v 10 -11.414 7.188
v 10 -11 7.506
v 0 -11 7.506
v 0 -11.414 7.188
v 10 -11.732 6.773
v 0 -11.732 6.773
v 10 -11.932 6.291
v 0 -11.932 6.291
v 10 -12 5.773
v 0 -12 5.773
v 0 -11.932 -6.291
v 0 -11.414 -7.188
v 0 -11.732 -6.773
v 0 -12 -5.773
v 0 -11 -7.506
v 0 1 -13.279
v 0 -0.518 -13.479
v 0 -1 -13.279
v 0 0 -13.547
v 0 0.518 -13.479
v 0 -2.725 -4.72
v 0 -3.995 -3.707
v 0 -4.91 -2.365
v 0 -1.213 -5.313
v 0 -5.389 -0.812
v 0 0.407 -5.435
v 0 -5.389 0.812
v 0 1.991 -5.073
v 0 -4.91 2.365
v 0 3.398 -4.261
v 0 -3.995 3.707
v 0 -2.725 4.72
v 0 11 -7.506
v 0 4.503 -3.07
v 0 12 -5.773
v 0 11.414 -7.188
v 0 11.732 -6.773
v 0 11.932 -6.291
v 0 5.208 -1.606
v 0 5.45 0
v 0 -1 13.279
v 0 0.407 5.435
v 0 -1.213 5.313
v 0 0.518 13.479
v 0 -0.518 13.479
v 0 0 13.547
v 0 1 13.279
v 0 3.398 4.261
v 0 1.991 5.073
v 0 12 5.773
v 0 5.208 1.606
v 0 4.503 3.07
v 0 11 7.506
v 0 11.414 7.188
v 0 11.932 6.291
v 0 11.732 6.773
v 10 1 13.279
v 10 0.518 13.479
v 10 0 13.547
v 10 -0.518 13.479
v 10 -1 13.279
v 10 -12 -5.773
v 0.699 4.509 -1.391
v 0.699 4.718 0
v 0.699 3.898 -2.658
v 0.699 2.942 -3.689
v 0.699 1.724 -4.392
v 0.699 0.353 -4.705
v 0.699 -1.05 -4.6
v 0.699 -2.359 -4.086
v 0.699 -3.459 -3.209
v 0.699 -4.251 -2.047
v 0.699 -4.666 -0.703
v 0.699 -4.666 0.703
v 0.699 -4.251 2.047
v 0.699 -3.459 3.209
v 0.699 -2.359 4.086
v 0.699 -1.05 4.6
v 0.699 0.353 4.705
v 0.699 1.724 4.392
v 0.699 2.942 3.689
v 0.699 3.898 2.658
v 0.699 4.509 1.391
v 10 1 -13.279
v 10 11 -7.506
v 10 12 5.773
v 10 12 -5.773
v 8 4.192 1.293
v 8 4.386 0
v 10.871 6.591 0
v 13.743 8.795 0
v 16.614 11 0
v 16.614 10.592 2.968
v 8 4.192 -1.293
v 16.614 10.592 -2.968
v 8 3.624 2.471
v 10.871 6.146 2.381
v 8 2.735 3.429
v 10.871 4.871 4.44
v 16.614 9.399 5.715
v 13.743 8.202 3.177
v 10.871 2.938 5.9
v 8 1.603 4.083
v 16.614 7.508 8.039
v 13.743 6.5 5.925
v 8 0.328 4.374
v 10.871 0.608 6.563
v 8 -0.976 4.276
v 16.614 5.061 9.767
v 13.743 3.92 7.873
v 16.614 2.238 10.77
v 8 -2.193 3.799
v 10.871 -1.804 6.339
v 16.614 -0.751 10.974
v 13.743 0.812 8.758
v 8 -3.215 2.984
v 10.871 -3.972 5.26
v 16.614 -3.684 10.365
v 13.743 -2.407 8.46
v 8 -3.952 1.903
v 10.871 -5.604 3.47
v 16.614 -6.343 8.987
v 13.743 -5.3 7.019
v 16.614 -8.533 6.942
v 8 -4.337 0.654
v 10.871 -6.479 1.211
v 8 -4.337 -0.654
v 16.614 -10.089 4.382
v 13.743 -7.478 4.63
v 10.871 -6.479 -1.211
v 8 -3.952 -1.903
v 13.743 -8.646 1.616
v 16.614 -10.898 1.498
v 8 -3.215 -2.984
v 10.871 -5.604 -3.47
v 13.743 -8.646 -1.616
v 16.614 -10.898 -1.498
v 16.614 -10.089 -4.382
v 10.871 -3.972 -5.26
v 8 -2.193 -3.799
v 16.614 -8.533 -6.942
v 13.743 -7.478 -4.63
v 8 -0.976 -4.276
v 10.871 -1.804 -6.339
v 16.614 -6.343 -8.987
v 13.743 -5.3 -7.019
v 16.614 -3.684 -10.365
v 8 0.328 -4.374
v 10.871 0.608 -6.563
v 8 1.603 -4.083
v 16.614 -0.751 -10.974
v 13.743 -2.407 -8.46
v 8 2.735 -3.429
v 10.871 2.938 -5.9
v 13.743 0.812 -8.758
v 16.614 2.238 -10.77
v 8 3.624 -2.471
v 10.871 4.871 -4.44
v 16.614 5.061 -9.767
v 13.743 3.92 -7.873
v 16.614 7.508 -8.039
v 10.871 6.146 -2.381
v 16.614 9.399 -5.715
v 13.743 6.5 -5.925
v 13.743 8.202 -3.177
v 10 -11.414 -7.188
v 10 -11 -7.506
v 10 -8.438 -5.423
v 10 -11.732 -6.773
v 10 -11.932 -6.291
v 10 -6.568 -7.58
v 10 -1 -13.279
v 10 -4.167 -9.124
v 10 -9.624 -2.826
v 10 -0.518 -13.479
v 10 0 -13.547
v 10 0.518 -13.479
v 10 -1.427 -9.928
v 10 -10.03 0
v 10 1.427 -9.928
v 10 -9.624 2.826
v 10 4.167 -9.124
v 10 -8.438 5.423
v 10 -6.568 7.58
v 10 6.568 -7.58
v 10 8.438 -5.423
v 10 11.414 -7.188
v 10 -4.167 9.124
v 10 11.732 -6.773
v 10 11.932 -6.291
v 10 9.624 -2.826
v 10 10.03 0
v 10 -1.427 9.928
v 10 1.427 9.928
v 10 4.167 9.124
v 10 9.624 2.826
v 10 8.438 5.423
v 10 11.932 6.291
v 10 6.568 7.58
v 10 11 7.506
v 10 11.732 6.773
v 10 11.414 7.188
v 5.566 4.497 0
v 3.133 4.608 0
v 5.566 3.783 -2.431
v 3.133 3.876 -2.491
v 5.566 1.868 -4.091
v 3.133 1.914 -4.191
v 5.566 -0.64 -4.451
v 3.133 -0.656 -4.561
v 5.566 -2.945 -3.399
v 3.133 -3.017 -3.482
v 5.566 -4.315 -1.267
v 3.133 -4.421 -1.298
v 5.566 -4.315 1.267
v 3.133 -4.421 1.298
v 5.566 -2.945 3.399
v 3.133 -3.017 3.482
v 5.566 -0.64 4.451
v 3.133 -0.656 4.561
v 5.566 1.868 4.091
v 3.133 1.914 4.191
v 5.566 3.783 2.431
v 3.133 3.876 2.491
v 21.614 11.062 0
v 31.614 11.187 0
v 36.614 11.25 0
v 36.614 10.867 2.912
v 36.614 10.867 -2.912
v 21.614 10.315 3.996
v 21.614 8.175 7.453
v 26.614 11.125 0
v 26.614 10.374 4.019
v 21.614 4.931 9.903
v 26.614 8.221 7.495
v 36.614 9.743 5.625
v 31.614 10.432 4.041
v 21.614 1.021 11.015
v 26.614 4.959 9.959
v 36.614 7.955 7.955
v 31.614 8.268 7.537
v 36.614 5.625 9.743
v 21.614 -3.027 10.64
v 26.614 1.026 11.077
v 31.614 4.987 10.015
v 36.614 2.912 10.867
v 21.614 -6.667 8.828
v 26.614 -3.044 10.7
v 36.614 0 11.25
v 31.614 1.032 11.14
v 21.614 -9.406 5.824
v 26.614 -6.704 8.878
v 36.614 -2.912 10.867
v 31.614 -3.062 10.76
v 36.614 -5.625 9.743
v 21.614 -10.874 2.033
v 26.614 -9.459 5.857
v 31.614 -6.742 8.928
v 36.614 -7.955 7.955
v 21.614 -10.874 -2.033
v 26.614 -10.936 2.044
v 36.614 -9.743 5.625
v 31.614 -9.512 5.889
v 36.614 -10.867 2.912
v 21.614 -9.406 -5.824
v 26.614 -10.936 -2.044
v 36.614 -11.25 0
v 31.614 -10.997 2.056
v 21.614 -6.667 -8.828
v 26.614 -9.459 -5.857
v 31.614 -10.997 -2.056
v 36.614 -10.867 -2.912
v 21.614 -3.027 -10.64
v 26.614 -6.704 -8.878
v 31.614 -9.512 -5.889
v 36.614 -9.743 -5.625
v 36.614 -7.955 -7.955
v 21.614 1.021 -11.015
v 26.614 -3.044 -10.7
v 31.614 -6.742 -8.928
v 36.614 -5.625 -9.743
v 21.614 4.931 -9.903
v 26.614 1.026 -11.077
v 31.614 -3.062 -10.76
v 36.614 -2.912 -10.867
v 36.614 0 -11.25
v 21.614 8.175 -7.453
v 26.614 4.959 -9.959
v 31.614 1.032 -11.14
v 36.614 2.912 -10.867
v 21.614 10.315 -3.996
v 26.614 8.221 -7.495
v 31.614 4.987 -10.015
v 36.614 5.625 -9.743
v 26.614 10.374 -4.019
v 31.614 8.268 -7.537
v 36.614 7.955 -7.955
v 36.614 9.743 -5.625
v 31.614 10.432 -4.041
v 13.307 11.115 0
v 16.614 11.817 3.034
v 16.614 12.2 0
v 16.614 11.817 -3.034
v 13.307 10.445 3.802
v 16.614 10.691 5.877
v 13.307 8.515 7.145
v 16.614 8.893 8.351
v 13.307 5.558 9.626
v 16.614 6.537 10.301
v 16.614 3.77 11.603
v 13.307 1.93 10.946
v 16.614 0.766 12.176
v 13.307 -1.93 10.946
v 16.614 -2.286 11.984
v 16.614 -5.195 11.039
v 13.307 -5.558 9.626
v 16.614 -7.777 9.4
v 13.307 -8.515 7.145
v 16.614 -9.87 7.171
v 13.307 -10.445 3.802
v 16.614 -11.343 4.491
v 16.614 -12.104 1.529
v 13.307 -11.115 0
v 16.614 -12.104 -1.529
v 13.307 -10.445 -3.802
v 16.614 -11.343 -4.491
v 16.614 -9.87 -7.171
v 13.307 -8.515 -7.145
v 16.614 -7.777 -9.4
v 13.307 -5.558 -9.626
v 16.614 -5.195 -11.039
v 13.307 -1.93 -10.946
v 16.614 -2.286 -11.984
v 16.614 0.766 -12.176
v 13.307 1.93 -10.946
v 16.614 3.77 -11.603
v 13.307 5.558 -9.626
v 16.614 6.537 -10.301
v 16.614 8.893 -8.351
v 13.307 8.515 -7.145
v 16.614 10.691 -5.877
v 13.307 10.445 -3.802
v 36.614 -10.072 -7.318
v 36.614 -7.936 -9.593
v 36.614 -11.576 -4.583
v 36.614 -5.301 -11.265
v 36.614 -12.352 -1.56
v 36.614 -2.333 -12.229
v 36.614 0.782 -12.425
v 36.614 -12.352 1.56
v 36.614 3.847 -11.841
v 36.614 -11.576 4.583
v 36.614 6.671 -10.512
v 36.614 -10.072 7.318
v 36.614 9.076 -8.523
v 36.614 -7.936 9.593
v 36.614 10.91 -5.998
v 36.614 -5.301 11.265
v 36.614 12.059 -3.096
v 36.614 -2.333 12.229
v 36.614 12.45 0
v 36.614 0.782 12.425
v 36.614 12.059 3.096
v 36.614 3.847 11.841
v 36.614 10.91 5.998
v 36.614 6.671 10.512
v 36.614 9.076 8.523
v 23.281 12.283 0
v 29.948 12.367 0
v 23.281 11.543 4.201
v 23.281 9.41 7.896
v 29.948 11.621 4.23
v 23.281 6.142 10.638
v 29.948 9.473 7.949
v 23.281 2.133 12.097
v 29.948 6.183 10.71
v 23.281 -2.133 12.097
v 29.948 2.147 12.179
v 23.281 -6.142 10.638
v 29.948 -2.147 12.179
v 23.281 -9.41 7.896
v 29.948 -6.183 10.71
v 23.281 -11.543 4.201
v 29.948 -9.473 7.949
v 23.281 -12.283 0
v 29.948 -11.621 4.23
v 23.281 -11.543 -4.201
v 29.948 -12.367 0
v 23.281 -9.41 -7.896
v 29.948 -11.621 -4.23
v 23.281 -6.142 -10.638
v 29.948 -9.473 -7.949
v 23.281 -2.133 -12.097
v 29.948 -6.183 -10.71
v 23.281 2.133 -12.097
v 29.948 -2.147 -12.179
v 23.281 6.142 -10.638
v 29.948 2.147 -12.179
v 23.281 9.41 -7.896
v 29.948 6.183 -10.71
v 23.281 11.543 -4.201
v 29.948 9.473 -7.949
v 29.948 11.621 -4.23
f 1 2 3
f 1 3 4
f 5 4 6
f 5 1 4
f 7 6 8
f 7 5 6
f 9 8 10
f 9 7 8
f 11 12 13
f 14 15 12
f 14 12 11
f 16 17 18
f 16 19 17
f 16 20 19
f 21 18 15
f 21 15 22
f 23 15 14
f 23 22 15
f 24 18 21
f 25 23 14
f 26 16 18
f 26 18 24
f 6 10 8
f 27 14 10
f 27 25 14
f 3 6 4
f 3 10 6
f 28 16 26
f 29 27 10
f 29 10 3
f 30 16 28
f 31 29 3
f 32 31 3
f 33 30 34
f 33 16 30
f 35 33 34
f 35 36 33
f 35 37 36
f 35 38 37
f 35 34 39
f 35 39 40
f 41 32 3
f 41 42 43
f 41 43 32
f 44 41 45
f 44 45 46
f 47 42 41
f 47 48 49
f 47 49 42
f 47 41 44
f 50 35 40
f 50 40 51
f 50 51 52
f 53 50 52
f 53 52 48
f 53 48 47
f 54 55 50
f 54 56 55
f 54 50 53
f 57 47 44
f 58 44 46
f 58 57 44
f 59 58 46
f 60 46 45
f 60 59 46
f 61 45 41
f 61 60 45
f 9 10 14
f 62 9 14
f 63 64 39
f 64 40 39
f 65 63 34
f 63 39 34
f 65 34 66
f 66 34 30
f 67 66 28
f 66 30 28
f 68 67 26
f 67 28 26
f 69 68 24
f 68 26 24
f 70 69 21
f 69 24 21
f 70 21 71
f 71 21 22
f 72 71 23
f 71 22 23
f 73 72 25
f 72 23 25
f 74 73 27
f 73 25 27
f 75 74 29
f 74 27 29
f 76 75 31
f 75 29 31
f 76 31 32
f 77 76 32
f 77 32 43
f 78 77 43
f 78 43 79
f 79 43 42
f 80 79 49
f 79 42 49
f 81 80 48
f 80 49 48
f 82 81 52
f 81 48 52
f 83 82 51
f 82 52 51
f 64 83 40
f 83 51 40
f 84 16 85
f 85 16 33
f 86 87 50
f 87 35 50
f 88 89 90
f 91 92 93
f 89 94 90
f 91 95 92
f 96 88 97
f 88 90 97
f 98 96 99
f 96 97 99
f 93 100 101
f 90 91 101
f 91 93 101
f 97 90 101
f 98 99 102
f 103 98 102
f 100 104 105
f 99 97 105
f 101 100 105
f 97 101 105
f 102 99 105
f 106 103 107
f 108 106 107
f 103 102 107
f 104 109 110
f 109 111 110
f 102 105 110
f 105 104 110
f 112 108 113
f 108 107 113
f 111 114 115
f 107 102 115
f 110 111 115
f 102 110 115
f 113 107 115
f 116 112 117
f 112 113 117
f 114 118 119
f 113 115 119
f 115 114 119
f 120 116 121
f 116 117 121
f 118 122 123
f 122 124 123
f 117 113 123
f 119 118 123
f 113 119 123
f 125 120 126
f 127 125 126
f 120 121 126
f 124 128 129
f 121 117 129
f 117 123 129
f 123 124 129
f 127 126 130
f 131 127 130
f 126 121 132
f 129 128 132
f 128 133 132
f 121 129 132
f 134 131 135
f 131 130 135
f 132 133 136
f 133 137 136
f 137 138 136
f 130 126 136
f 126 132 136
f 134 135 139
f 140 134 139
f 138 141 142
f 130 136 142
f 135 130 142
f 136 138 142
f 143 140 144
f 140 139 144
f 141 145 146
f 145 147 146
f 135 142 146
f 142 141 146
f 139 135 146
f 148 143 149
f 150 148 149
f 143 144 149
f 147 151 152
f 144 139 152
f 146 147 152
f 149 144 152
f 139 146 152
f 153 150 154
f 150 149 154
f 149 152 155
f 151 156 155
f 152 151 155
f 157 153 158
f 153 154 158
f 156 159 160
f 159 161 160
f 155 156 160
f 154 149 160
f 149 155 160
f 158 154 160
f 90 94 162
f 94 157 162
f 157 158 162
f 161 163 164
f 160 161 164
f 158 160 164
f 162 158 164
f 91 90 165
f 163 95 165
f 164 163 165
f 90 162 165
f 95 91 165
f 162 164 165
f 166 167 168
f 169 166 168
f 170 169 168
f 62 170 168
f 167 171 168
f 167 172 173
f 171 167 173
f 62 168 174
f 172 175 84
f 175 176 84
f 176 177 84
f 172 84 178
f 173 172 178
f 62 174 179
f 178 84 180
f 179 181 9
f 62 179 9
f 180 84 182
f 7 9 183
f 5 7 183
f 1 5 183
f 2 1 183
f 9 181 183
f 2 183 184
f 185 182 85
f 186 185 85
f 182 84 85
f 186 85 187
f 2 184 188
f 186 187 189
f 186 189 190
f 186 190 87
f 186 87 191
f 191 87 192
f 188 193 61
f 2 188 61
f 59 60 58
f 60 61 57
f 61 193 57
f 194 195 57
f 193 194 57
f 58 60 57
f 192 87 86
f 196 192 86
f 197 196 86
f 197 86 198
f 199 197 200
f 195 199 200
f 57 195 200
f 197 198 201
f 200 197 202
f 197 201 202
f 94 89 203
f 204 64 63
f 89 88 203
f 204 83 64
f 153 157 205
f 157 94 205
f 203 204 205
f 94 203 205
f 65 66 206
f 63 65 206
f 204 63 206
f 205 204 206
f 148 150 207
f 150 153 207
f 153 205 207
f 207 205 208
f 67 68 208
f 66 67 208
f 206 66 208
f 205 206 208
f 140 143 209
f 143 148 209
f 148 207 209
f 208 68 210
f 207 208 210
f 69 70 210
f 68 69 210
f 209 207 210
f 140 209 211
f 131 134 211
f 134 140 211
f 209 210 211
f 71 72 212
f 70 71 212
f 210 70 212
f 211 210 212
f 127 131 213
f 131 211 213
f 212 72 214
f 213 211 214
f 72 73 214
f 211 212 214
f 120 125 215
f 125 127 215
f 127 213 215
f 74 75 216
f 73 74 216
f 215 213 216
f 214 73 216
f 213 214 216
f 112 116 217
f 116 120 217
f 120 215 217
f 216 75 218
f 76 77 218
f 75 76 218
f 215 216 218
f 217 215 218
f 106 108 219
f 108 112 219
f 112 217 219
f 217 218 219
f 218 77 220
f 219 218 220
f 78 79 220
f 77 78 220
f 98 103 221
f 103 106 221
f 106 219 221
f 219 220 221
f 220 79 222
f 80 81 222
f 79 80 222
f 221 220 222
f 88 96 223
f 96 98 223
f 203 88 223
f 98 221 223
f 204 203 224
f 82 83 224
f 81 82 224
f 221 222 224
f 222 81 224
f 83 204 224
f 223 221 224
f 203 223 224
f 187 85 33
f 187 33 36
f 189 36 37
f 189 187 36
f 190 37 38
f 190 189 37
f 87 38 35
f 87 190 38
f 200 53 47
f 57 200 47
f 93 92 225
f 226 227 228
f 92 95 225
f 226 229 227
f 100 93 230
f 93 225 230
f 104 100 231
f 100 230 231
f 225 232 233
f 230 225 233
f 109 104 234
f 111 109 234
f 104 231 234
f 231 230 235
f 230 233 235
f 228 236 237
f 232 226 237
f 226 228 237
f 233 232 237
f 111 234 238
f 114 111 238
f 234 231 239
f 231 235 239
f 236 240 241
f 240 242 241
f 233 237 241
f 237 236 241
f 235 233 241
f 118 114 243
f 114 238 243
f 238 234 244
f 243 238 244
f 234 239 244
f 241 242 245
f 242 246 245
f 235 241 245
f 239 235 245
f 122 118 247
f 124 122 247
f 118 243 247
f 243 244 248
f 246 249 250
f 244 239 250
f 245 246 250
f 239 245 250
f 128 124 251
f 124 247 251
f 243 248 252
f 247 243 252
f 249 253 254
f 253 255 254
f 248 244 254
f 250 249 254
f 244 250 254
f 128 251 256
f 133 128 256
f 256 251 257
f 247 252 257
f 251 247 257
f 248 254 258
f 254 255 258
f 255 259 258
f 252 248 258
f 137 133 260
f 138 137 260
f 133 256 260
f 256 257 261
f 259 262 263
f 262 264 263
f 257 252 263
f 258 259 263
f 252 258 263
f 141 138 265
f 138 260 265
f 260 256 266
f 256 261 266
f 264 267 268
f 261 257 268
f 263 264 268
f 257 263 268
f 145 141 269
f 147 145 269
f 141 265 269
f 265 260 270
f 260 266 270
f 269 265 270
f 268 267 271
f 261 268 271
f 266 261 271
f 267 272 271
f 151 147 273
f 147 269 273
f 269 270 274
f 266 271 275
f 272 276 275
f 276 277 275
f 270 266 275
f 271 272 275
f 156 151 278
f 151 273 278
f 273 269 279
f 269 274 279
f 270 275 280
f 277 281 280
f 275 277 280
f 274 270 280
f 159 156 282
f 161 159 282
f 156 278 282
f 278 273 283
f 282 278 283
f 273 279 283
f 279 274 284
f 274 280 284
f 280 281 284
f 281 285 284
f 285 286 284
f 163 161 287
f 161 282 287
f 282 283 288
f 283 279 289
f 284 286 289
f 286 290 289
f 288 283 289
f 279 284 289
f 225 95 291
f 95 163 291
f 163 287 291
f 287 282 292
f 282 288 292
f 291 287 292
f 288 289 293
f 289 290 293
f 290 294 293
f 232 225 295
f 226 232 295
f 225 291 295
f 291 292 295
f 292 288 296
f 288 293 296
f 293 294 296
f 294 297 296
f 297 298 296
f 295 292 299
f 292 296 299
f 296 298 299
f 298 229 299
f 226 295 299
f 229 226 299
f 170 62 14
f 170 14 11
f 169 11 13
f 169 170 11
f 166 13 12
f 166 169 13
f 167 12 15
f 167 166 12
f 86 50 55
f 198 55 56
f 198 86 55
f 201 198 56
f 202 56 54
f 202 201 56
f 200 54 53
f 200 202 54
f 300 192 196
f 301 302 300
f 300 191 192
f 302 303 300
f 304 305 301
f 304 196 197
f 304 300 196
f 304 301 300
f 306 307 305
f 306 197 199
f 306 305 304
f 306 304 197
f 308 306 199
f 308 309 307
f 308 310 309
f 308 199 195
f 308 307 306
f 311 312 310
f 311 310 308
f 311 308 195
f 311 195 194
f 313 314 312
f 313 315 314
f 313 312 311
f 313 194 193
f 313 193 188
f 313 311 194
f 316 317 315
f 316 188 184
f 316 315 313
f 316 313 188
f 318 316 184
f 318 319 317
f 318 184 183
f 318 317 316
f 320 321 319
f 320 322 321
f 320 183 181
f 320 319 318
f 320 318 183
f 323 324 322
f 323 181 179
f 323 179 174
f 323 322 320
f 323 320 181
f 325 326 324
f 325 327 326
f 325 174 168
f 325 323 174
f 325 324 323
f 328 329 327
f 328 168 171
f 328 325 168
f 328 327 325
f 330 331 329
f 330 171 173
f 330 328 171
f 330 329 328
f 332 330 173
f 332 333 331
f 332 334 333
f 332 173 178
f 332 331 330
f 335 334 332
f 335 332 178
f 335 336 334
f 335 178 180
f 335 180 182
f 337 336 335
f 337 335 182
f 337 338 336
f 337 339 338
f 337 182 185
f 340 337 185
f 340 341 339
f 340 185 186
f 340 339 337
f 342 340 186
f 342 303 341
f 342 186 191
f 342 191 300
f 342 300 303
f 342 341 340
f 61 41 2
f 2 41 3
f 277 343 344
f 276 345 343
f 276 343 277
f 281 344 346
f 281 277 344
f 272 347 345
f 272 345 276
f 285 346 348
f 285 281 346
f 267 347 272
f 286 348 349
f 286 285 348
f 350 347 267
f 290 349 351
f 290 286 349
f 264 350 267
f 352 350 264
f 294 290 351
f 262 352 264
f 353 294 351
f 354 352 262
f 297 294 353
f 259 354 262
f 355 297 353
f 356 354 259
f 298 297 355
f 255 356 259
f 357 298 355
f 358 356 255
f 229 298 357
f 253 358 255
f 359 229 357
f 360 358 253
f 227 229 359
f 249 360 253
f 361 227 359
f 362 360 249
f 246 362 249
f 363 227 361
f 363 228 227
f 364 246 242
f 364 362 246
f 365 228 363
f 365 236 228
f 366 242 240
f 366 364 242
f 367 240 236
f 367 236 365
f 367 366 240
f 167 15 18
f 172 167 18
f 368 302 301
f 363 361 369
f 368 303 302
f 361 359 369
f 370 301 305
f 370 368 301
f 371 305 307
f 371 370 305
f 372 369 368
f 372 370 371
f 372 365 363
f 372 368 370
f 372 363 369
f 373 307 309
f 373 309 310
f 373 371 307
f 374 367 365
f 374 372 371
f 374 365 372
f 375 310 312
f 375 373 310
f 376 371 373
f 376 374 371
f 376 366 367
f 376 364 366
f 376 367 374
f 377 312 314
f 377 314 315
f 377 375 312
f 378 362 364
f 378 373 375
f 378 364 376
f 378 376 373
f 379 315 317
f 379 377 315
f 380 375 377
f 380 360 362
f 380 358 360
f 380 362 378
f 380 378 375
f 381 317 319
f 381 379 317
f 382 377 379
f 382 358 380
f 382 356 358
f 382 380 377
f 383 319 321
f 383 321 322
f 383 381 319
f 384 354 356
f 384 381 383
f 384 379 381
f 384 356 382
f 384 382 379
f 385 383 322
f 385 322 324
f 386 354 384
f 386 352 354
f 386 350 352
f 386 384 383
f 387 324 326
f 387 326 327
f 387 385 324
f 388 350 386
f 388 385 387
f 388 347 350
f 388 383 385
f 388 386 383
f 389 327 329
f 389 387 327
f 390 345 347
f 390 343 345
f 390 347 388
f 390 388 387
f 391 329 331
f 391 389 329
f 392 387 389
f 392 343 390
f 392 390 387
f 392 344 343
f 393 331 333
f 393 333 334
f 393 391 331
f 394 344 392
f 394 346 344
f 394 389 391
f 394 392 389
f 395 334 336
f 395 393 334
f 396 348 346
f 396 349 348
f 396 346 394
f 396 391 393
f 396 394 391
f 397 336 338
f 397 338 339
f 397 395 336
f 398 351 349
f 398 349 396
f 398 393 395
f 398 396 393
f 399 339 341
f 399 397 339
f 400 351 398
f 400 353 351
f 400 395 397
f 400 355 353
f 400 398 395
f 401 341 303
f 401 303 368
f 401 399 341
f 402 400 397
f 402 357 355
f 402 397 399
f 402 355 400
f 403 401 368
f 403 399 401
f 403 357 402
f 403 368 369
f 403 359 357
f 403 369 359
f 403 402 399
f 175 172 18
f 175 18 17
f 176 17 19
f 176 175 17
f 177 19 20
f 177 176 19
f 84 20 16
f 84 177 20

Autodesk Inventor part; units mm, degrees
ref_plane "YZ Plane" through (0, 0, 0) normal (1, 0, 0) x (0, 1, 0)
ref_plane "XZ Plane" through (0, 0, 0) normal (0, 1, 0) x (-1, 0, 0)
ref_plane "XY Plane" through (0, 0, 0) normal (0, 0, 1) x (1, 0, 0)
sketch "Sketch1" plane through (0, 0, 0) normal (0, 0, 1) x (1, 0, 0)
  line L0 (0, 0) -> (6.6144, 0) construction
  line L1 (0, 0) -> (0, 4.75) construction
  line L2 (0, 4.75) -> (8, 4.3864)
  line L3 (6.6144, 0) -> (16.6144, 0) construction
  line L4 (16.6144, 0) -> (16.6144, 12.2) construction
  line L5 (16.6144, 0) -> (36.6144, 0) construction
  line L6 (36.6144, 0) -> (36.6144, 12.45) construction
  line L7 (36.6144, 12.45) -> (16.6144, 12.2)
  line L8 (0, 4.75) -> (0, 6.75)
  line L9 (0, 4.75) -> (2, 4.75) construction
  line L10 (0, 6.75) -> (16.6144, 12.2)
  line L11 (8, 4.3864) -> (16.6144, 11)
  line L12 (16.6144, 11) -> (36.6144, 11.2499)
  line L13 (36.6144, 11.2499) -> (36.6144, 12.45)
  line L14 (0, 0) -> (3.3, 0) construction
  line L15 (3.3, 0) -> (3.3, 4.6) construction
  dimension "d2" = 4.75
  dimension "d3" = 12.2
  dimension "d4" = 20
  dimension "d5" = 12.45
  dimension "d6" = 2
  dimension "d7" = 90
  dimension "d8" = 1.2
  dimension "d9" = 1.2
  dimension "d10" = 10
  dimension "d24" = 177.397
  dimension "d25" = 8
  dimension "d26" = 3.3
  dimension "d27" = 4.6
  dimension "d28" = 6.6144
revolve "Revolution1" add sketch "Sketch1" angle 360 about axis through (6.6144, 0, 0) along (1, 0, 0)
sketch "Sketch2" plane through (0, 0, 0) normal (-1, 0, 0) x (0, 0, 1)
  circle A0 centre (0, 0) radius 6.75 projected
  line L0 (0, -6.75) -> (0, -12.2) construction
  circle A1 centre (0, 0) radius 12.2 projected
  line L1 (1.633, -6.5495) -> (2.9514, -11.8376)
  line L2 (-1.633, -6.5495) -> (-2.9514, -11.8376)
  point P0 (-1.633, -6.5495)
  point P1 (-2.9514, -11.8376)
  dimension "d12" = 14
extrude "Extrusion1" [suppressed]
chamfer "Chamfer1" [suppressed]
pattern_circular "Circular Pattern1" [suppressed]
chamfer "Chamfer2" distance 0.7 angle 45 1 edges at (0, -4.75, 0)
sketch "Sketch3" plane through (0, 0, 0) normal (-1, 0, 0) x (0, 0, 1)
  line L0 (-6.9282, -12) -> (-13.8564, 0)
  line L1 (-13.8564, 0) -> (-6.9282, 12)
  line L2 (-6.9282, 12) -> (6.9282, 12)
  line L3 (6.9282, 12) -> (13.8564, 0)
  line L4 (13.8564, 0) -> (6.9282, -12)
  line L5 (6.9282, -12) -> (-6.9282, -12)
  circle A0 centre (0, 0) radius 6.75 projected
  point P0 (0, -12)
  dimension "d32" = 24
extrude "Extrusion2" add sketch "Sketch3" against normal blind 10
fillet "Fillet1" radius 2 6 edges at (5, 12, 6.9282) (5, 12, -6.9282) (5, 0, -13.8564) (5, -12, -6.9282) (5, -12, 6.9282) (5, 0, 13.8564)
equation "\"Tol\" = 0"
properties part number "PneumaticAdaptorFemale"
